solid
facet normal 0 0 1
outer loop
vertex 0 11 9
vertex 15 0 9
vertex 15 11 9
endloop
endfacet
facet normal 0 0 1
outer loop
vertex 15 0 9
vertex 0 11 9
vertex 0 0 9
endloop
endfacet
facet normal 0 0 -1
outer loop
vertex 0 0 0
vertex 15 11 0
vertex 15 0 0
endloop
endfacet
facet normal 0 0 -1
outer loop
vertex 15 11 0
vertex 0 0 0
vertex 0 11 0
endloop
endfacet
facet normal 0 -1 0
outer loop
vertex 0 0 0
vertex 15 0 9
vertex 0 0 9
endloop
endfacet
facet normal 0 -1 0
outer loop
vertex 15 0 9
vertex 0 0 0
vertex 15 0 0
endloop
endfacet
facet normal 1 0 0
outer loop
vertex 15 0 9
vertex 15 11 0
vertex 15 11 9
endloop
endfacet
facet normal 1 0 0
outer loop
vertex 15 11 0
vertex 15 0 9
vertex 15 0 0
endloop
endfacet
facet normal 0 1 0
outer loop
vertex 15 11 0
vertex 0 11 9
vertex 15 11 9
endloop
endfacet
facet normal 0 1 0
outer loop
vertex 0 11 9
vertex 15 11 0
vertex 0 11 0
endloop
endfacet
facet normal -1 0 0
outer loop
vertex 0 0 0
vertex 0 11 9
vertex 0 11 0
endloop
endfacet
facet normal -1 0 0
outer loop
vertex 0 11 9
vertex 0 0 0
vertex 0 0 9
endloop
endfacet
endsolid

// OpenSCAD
// Generated by SolidPython 1.0.1 on 2020-07-29 00:46:55


cube(size = [15, 11, 9]);
/***********************************************
*********      SolidPython code:      **********
************************************************
 
# import packages: SolidPython
from solid import *
from solid.utils import *
from itertools import chain, combinations, permutations


class Resize:

    def __init__(self, scad_file):
        self.scad_file = scad_file
        #self.scad_file = import_scad(scad_file)
        # cone/cylinder param:
        self.r1 = 0
        self.r2 = 0
        self.h = 0
        # rectangular prism param:
        self.w = 0
        self.l = 0
        # ellipse param:
        self.r = 0

    # import OpenScad code (file name corresponds to shape)


    # classify shape + parameters
    def assign(self, param1, param2, param3):
        if self.scad_file == 'cone.scad':
            self.r1 = param1
            self.r2 = param2
            self.h = param3
        elif self.scad_file == 'cylinder.scad':
            self.r1 = param1
            self.r2 = param2
            self.h = param3
        elif self.scad_file == 'rectangularPrism.scad':
            self.h = param1
            self.l = param2
            self.w = param3
        else:
            self.r = param1
            self.h = param2

    # resize parameters
    def iterate(self):
        x = range(3, 20, 2)
        i = 1
        if self.scad_file == 'cone.scad':
            tempList = list(permutations(x, 2))
            for temp in tempList:
                param1 = temp[0]
                param2 = temp[1]
                filepath = 'produced_scad_files/' + 'cone' + str(param1) + '_' + str(param2) + '_' + '.scad'
                scad_render_to_file(cylinder(h=param1, r1=param2, r2=0), filepath)

        elif self.scad_file == 'cylinder.scad':
            tempList = list(permutations(x, 3))
            for temp in tempList:
                param1 = temp[0]
                param2 = temp[1]
                filepath = 'produced_scad_files/' + 'cylinder' + str(param1) + '_' + str(param2) + '_' + '.scad'
                scad_render_to_file(cylinder(h=param1, r1=param2, r2=param2), filepath)

        elif self.scad_file == 'rectangularPrism.scad':
            tempList = list(permutations(x, 3))
            for temp in tempList:
                param1 = temp[0]
                param2 = temp[1]
                param3 = temp[2]
                filepath = 'produced_scad_files/' + 'rectangularPrism' + str(param1) + '_' + str(param2) + '_' + str(
                    param3) + '.scad'
                scad_render_to_file(cube(size=(param1, param2, param3)), filepath)

        elif self.scad_file == 'ellipse.scad':
            tempList = list(permutations(x, 4))
            for temp in tempList:
                param1 = temp[0]
                param2 = temp[1]
                param3 = temp[2]
                param4 = temp[3]
                filepath = 'produced_scad_files/' + 'ellipse' + str(param1) + '_' + str(param2) + '_' + str(param3) + '_' + str(param4) + '.scad'
                scad_render_to_file(scale([param1, param2, param3])(sphere(r=param4)), filepath)

    def render_to_scadfile(self):
        scad_render_to_file(scad, 'example.scad') 
 
************************************************/
